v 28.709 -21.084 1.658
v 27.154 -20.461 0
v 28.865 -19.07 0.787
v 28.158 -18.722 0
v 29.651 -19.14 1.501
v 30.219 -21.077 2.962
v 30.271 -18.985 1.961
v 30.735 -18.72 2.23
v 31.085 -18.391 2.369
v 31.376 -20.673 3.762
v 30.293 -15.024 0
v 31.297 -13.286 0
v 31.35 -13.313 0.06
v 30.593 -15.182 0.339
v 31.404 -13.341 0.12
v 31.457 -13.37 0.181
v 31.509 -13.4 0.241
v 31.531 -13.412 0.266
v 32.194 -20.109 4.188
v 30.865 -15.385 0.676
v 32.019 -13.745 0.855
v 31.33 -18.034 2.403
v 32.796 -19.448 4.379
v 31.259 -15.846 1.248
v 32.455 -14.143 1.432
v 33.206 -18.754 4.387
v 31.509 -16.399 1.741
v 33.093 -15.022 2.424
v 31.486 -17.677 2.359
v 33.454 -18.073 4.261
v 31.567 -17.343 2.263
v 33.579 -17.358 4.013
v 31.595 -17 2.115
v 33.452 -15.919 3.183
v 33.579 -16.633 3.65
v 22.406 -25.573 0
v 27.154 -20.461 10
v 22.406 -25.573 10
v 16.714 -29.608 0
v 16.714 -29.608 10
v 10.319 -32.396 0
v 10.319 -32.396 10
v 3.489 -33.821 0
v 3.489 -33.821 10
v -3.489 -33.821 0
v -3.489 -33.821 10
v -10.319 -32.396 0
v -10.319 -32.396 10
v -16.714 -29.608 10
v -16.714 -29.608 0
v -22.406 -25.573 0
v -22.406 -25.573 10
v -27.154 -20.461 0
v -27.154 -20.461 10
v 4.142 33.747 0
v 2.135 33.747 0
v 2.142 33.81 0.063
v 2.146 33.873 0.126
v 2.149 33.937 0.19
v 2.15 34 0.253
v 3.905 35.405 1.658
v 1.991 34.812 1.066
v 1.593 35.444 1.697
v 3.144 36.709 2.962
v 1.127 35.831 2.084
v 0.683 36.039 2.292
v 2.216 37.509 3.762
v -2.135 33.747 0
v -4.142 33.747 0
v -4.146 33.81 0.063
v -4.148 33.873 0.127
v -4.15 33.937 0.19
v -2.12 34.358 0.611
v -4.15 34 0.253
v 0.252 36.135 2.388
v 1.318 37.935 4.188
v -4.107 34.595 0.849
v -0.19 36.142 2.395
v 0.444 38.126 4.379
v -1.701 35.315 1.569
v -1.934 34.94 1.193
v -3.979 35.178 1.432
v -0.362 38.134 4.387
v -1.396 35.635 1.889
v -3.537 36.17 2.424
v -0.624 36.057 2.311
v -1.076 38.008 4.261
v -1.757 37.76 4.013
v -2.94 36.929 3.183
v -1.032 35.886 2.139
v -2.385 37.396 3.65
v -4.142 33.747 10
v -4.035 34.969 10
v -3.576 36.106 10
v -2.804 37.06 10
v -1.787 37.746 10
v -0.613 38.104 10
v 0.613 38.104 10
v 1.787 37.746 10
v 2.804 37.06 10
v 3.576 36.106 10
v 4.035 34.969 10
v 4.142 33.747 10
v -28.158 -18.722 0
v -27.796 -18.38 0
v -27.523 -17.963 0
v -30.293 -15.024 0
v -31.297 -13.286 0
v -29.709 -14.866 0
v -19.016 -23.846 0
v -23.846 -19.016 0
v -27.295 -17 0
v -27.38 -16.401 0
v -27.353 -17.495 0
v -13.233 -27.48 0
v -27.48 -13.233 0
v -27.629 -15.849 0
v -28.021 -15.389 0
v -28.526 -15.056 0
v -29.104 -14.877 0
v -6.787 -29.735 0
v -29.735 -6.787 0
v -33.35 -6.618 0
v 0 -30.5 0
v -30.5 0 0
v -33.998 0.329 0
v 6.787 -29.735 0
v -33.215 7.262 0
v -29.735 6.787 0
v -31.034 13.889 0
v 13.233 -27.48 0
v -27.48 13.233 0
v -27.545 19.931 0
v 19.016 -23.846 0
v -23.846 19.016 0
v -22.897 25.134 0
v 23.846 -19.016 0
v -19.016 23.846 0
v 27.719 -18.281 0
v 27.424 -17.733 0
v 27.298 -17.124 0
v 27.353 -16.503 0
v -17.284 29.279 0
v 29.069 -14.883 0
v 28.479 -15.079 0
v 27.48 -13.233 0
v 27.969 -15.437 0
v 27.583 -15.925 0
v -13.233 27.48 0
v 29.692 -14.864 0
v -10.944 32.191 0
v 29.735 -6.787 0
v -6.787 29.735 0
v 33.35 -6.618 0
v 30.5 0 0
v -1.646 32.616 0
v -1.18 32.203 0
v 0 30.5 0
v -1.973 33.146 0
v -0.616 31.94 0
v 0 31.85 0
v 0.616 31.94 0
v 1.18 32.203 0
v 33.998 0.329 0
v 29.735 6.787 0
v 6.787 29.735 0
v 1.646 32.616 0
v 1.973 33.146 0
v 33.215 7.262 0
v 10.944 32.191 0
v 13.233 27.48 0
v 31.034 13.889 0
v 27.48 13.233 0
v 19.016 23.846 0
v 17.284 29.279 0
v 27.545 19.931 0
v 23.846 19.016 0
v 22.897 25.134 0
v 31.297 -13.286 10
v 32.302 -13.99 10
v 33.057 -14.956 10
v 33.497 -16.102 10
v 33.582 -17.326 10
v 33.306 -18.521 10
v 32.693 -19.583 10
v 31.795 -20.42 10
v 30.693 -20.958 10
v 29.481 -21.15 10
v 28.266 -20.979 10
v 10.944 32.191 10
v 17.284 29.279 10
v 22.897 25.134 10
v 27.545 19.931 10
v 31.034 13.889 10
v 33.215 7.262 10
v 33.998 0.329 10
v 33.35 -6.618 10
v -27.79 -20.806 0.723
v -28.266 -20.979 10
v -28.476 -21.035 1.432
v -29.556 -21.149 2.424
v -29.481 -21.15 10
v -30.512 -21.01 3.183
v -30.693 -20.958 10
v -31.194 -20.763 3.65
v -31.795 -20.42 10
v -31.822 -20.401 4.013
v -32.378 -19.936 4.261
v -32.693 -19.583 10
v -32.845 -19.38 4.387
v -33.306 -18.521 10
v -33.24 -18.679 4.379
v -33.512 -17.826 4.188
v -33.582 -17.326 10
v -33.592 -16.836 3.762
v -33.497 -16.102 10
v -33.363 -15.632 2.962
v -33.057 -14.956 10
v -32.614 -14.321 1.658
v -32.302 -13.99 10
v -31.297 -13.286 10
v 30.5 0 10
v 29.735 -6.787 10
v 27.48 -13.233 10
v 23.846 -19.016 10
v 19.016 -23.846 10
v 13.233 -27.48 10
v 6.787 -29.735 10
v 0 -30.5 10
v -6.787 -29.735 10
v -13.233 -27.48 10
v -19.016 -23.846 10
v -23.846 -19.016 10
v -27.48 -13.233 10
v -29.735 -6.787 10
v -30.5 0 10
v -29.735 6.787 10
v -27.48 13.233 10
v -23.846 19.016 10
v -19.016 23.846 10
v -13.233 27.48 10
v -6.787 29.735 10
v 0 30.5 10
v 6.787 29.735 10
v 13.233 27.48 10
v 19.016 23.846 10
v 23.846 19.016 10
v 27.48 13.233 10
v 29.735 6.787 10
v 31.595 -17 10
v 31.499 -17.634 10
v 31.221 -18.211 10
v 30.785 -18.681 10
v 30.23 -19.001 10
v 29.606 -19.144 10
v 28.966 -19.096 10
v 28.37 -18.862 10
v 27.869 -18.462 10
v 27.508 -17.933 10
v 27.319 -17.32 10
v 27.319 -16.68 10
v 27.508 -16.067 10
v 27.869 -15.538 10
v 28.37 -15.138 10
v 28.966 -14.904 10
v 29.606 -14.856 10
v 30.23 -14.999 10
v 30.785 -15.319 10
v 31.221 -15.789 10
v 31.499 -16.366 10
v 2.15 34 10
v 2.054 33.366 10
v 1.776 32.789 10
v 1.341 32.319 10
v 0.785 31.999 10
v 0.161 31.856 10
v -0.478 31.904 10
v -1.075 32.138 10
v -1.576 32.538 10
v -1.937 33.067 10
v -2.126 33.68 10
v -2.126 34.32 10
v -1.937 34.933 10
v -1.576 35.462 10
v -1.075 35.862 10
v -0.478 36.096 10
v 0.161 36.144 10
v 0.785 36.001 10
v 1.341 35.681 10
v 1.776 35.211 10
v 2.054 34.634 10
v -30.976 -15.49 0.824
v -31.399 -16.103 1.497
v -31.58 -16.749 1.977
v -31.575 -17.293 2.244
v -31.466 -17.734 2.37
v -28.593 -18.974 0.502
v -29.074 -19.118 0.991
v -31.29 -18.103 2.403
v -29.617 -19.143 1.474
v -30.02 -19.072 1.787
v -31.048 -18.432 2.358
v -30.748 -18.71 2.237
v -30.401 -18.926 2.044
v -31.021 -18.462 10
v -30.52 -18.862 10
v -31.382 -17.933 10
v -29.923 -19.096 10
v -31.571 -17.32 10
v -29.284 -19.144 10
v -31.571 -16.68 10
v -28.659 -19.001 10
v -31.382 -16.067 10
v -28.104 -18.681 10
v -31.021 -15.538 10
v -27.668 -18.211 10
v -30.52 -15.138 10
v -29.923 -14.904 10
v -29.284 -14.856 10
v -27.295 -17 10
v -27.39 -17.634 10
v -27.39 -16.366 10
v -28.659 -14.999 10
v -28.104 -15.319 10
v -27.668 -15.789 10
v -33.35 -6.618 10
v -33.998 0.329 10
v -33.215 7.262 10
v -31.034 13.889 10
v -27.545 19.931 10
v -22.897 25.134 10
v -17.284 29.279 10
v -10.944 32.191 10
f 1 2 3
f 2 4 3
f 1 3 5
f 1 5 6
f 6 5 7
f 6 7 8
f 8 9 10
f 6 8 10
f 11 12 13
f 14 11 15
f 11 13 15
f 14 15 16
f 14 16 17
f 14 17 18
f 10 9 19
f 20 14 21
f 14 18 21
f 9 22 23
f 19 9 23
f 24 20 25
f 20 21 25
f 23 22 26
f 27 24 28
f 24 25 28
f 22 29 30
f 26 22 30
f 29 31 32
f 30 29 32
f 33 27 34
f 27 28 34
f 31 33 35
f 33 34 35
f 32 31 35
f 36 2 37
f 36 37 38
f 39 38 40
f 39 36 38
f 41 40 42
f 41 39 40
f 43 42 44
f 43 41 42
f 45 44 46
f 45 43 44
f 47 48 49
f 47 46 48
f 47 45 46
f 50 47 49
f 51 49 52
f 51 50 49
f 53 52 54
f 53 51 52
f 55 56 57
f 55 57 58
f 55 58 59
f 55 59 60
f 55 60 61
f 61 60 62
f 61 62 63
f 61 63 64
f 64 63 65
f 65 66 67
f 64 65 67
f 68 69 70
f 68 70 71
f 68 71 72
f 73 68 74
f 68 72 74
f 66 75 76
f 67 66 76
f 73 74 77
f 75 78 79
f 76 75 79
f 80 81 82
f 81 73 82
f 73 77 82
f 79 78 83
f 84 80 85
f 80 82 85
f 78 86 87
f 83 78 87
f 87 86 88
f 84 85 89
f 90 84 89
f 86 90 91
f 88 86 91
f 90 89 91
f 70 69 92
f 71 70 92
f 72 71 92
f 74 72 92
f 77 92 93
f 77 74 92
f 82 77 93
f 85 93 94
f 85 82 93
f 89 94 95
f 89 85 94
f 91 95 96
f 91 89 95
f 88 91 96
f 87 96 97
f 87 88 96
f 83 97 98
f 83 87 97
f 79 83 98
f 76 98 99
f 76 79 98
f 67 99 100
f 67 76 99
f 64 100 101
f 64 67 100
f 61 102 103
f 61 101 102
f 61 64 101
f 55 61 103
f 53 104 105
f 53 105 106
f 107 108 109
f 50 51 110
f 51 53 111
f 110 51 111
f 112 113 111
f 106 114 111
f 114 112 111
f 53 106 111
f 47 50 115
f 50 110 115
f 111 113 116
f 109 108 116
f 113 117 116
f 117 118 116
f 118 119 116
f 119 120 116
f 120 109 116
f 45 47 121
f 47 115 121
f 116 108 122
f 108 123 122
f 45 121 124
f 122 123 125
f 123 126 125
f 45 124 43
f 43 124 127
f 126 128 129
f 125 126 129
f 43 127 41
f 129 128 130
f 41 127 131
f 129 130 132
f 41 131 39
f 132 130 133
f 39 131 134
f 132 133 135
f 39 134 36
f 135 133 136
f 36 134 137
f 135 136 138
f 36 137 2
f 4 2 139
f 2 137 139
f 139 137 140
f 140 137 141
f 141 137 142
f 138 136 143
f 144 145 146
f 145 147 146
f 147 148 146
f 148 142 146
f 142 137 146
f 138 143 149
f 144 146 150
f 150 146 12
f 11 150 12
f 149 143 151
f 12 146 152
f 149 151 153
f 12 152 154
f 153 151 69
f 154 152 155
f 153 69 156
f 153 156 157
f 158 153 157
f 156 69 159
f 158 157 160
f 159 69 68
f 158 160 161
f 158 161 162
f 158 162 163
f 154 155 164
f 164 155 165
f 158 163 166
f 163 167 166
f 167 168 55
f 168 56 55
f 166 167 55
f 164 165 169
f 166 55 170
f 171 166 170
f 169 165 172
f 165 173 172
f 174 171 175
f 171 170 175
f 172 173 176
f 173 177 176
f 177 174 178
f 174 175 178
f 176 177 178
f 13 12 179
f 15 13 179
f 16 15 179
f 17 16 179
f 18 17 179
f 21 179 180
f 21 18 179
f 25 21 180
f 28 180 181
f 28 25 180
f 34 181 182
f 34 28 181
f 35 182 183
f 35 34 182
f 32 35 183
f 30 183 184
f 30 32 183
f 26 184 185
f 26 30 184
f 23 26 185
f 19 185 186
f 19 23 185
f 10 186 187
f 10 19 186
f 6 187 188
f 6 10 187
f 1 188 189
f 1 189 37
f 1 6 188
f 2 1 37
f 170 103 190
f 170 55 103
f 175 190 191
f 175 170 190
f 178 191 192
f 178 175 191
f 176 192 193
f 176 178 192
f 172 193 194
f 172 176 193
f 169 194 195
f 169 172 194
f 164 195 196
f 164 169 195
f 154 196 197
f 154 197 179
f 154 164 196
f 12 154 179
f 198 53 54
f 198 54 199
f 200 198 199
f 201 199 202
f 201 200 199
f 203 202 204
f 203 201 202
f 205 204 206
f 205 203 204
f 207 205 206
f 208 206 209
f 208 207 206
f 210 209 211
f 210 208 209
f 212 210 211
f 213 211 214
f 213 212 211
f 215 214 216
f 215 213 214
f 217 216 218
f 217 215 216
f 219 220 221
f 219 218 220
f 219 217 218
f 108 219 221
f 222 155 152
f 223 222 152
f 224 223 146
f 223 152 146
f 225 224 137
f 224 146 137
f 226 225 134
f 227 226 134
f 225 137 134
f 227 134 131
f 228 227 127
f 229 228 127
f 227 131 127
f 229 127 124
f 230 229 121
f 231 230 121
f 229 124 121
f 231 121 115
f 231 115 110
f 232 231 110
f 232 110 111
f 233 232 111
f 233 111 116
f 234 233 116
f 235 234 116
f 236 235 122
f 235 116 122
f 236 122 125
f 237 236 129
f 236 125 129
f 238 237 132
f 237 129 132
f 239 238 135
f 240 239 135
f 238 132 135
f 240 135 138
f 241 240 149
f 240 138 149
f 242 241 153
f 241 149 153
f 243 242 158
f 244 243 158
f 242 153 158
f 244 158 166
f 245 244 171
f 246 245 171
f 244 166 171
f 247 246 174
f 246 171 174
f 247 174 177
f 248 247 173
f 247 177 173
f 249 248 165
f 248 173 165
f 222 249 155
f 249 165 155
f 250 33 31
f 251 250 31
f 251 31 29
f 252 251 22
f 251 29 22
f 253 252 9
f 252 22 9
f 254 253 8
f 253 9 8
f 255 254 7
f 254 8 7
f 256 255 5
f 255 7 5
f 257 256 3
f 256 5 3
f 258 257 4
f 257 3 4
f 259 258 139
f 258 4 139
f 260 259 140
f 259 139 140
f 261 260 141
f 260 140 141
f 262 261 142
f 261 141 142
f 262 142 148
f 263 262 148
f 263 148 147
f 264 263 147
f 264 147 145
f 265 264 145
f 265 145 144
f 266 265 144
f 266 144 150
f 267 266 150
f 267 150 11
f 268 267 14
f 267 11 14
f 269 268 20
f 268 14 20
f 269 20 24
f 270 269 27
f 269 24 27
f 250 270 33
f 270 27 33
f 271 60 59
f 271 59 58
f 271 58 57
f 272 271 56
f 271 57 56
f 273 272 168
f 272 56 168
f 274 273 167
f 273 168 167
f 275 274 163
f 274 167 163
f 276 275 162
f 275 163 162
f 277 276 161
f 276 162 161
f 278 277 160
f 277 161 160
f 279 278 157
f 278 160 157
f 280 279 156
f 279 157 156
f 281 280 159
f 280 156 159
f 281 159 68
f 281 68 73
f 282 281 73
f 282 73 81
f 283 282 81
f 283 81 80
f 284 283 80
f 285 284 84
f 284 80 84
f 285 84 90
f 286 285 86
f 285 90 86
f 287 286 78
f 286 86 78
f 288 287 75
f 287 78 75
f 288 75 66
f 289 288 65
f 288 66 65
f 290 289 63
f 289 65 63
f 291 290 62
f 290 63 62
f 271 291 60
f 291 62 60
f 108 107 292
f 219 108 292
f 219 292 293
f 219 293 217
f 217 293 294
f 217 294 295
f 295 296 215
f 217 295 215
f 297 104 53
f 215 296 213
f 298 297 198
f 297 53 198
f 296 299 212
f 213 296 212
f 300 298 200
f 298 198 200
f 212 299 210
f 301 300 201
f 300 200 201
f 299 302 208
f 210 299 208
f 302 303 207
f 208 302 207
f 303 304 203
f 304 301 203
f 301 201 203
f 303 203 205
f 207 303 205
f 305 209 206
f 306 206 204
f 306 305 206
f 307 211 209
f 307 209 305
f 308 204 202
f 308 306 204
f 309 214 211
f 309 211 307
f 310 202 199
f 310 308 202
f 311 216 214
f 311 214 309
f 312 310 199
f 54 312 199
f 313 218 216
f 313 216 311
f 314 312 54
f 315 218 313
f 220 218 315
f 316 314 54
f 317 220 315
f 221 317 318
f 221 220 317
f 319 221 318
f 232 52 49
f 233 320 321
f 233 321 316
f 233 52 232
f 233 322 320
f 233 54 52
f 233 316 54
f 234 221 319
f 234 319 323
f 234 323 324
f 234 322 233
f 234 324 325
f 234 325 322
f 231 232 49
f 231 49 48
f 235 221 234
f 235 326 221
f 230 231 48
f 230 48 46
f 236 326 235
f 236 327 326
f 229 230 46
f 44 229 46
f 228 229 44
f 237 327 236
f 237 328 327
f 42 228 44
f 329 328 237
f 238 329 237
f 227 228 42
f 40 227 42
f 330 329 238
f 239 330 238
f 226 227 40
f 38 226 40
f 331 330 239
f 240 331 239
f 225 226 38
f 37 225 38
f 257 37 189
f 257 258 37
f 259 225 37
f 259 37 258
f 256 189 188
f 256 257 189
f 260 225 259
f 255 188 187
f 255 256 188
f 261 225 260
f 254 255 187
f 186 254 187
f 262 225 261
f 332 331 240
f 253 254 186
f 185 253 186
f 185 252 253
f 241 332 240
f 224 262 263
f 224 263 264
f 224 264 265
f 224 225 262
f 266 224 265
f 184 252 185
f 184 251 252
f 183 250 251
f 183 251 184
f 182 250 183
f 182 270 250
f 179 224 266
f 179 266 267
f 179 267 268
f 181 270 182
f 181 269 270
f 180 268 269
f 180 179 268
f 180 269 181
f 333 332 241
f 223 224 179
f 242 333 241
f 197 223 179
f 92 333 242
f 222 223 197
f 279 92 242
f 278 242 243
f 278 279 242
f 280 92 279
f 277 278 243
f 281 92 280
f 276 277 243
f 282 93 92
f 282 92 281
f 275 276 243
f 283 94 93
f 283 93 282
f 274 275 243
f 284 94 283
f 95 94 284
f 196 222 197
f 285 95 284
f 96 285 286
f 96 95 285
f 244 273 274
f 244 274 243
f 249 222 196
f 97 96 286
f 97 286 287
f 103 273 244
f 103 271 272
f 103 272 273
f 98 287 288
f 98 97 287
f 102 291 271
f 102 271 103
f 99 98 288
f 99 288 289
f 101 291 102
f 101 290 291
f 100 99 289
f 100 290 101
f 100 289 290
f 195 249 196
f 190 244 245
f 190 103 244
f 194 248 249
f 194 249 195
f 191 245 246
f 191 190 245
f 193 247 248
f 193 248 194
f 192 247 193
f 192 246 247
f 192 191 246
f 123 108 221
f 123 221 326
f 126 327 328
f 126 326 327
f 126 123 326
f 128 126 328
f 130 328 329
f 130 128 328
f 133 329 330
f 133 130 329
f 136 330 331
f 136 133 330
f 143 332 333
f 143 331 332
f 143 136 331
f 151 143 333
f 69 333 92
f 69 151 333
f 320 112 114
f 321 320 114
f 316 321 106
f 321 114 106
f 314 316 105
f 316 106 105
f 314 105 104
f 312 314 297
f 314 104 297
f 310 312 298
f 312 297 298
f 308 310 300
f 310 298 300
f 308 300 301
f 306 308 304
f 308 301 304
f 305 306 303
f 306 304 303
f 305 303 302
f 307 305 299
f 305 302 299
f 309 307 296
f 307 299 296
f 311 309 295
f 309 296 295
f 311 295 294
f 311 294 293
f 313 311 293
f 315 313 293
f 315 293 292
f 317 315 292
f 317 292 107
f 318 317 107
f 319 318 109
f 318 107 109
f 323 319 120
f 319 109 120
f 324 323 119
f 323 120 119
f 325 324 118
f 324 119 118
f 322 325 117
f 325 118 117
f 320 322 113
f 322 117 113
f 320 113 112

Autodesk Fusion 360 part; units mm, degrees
sketch "Sketch2" plane through (0, 0, 0) normal (0, 0, 1) x (1, 0, 0)
  circle A0 centre (0, 0) radius 34
  circle A1 centre (0, 0) radius 22.5
  circle A2 centre (0, 34) radius 2.15
  circle A3 centre (0, 34) radius 4.15
  circle A4 centre (-29.4449, -17) radius 2.15
  circle A5 centre (29.4449, -17) radius 2.15
  circle A6 centre (0, 0) radius 30.5
  line L0 (0, 38.15) -> (0, 29.85) construction
  line L1 (4.15, 38.15) -> (-4.15, 29.85) construction
  line L2 (-4.15, 38.15) -> (4.15, 29.85) construction
  circle A7 centre (-29.4449, -17) radius 4.15
  circle A8 centre (29.4449, -17) radius 4.15
  point P0 (0, 34)
  dimension "d19" = 68
  dimension "d21" = 45
  dimension "d22" = 4.3
  dimension "d23" = 2
  dimension "d25" = 360
  dimension "d29" = 61
extrude "main" add sketch "Sketch2" along normal blind 10 contours A0 A3 A6 A8 | A0 A2 A3 A6 | A0 A2 A3 | A0 A5 A8 | A0 A5 A6 A8 | A0 A3 A6 A7 | A0 A6 A7 A8 | A0 A4 A6 A7 | A0 A4 A7
ref_plane "WorkPlane1" through (-4.15, 34, 6.304) normal (-1, 0, 0) x (0, 1, 0)
sketch "Sketch3" plane through (-4.15, 0, 0) normal (-1, 0, 0) x (0, -1, 0)
  line L0 (-33.7467, 0) -> (-39.4074, 5.6606)
  line L1 (-33.7467, 0) -> (-41.6458, 0) construction
  line L2 (-33.7467, 0) -> (-39, 0)
  line L3 (-33.7467, 0) -> (-39.699, 0)
  line L4 (-39.4074, 5.6606) -> (-39.4074, 0)
  line L5 (13.2861, 0) -> (-33.7467, 0)
  line L6 (13.2861, 0) -> (13.2861, 10)
  line L7 (13.2861, 10) -> (-33.7467, 10)
  line L8 (-33.7467, 10) -> (-33.7467, 0)
  dimension "d43" = 45
extrude "side cut" cut sketch "Sketch3" against normal blind 15 contours L0 L2 L3 L4
pattern_circular "C-Pattern1" count 3 over 360 about axis through (0, 0, 1.75) along (0, 0, 1) of "side cut"
equation "gear_ratio = 6"
equation "gear_Ns = 12"
equation "gear_Nr = ( gear_ratio - 1 ) * gear_Ns"
equation "gear_Np = ( gear_ratio - 2 ) * gear_Ns / 2"
equation "gear_width = 10 mm"
equation "gear_backlash = 0.25 mm"
equation "gear_sp = ( ( gear_Ns + gear_Np ) / 2 ) * 1 mm"
equation "gear_OD = ( gear_Nr ) * 1 mm + 8 mm"
equation "ring_width = 52 mm"
equation "m3_hole_thickness = 2 mm"
equation "m3_inserts = 4.3 mm"
equation "d19 = gear_OD"
equation "output_bearing_od = 47 mm"
equation "d21 = output_bearing_od - 2 mm"
equation "d22 = m3_inserts"
equation "d23 = m3_hole_thickness"
equation "d29 = gear_OD - wall_thickness"
equation "wall_thickness = 7 mm"
equation "d33 = height"
equation "height = 10 mm"
